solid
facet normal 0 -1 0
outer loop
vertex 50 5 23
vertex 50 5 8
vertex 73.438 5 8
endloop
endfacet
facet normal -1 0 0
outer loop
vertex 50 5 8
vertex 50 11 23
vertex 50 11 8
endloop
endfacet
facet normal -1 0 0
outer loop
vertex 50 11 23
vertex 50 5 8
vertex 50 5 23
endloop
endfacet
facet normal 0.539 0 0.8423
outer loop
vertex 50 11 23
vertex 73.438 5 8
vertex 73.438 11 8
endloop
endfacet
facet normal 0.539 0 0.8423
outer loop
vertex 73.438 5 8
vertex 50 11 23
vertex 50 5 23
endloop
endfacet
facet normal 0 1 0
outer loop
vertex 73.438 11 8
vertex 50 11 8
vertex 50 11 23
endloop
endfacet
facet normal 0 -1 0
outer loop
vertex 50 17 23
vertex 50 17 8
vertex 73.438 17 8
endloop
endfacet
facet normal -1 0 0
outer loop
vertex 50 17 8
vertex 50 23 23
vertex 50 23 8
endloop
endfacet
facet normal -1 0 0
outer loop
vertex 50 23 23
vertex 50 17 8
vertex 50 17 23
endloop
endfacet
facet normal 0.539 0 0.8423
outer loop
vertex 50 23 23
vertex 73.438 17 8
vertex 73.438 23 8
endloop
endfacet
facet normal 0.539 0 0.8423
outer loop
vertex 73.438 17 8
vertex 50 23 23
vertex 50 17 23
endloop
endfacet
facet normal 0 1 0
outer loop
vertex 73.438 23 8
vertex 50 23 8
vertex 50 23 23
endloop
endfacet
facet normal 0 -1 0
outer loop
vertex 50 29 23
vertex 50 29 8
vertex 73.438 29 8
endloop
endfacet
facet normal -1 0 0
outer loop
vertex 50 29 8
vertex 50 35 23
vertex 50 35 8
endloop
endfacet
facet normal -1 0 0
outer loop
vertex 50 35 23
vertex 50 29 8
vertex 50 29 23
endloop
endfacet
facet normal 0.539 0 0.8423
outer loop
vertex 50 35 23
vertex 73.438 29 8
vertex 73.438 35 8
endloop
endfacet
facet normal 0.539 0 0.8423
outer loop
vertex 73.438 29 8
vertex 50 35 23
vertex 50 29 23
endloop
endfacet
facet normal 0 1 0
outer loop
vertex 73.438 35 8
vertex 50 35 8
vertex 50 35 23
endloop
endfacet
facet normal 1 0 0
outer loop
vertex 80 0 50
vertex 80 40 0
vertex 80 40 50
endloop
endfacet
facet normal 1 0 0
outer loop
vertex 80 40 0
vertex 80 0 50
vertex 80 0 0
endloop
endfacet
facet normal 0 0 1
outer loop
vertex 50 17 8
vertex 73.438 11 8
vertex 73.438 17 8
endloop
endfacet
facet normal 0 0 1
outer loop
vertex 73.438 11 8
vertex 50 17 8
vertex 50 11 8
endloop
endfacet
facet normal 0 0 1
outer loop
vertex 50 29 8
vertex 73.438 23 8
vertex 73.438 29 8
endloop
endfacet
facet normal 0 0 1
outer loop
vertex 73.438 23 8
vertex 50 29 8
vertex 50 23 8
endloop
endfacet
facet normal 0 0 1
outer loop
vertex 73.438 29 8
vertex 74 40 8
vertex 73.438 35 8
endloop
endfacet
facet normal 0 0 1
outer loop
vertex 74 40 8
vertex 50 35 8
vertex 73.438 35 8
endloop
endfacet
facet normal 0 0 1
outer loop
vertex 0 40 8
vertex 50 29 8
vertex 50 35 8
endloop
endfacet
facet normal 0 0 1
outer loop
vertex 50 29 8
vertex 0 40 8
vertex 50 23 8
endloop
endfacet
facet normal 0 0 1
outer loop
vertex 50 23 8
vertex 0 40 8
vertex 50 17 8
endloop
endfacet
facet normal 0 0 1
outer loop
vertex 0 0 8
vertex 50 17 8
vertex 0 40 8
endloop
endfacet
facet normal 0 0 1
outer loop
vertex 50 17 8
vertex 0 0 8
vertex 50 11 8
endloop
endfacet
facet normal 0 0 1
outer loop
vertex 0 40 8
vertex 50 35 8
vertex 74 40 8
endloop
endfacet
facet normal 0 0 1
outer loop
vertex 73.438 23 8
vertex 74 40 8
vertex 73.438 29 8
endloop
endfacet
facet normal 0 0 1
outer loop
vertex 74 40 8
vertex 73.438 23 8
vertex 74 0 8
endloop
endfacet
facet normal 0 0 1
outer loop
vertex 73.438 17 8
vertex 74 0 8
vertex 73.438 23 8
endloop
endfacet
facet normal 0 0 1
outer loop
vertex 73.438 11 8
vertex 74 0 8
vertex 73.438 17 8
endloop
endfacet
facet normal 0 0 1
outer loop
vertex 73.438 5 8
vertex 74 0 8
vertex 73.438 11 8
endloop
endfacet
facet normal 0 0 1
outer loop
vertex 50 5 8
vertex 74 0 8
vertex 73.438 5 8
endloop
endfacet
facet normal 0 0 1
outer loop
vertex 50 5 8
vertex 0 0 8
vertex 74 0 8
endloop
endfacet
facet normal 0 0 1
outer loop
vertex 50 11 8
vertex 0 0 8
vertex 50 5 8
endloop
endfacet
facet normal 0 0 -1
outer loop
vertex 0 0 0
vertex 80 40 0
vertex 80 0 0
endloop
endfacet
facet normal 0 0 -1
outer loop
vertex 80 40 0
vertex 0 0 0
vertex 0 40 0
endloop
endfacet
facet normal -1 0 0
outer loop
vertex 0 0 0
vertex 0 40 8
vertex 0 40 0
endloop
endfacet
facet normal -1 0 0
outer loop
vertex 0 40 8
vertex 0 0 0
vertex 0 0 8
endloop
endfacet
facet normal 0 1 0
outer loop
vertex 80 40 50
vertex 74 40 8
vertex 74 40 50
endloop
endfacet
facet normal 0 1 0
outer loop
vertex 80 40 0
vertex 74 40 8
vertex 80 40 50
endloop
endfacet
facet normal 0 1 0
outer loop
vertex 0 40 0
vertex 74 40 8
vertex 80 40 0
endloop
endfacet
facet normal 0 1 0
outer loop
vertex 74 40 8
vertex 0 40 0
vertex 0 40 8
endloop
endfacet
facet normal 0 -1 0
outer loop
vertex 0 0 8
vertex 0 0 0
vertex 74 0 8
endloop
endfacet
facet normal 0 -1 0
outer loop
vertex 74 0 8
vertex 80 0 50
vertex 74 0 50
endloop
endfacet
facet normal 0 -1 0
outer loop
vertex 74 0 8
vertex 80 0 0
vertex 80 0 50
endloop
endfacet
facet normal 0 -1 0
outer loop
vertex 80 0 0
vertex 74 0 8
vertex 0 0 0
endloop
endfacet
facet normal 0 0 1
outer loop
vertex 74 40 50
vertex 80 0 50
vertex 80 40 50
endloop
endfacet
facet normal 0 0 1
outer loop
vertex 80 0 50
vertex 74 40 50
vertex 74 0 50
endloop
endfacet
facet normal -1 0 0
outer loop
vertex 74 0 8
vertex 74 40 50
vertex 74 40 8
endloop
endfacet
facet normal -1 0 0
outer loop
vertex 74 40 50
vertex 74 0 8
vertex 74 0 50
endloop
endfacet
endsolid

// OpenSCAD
$fn = 32;

// ----------------------------------------------------------------------
// Rib bracket: 3-gusset L bracket
// ----------------------------------------------------------------------

// --- parameters (mm) ---
base_l = 80;              // foot length, X
base_w = 40;              // foot width, Y
base_t = 8;               // foot thickness
plate_t = 6;              // upright plate thickness
plate_h = 50;             // overall height
gus_l = 24;               // gusset leg along the foot
gus_h = 16;               // gusset height
gus_t = 6;                // gusset thickness
gus_edge = 5;             // gusset margin from the foot edge
n_gus = 3;                // gusset count
fit_tol = 0.1;            // tolerance for press fits, mm
free_tol = 0.5;           // tolerance for clearance fits, mm

gus_pitch = (base_w - 2 * gus_edge - gus_t) / (n_gus - 1);  // gusset pitch

union() {
  cube([base_l, base_w, base_t]);
  translate([base_l - plate_t, 0, base_t - 1])
    cube([plate_t, base_w, plate_h - base_t + 1]);
  for (i = [0 : n_gus - 1])
    translate([base_l - plate_t - gus_l, gus_edge + i * gus_pitch, base_t - 1])
      rotate([-90, 0, 0])
        linear_extrude(height = gus_t)
          polygon(points = [[0, 0], [gus_l + 1, 0], [0, -gus_h]]);
}
